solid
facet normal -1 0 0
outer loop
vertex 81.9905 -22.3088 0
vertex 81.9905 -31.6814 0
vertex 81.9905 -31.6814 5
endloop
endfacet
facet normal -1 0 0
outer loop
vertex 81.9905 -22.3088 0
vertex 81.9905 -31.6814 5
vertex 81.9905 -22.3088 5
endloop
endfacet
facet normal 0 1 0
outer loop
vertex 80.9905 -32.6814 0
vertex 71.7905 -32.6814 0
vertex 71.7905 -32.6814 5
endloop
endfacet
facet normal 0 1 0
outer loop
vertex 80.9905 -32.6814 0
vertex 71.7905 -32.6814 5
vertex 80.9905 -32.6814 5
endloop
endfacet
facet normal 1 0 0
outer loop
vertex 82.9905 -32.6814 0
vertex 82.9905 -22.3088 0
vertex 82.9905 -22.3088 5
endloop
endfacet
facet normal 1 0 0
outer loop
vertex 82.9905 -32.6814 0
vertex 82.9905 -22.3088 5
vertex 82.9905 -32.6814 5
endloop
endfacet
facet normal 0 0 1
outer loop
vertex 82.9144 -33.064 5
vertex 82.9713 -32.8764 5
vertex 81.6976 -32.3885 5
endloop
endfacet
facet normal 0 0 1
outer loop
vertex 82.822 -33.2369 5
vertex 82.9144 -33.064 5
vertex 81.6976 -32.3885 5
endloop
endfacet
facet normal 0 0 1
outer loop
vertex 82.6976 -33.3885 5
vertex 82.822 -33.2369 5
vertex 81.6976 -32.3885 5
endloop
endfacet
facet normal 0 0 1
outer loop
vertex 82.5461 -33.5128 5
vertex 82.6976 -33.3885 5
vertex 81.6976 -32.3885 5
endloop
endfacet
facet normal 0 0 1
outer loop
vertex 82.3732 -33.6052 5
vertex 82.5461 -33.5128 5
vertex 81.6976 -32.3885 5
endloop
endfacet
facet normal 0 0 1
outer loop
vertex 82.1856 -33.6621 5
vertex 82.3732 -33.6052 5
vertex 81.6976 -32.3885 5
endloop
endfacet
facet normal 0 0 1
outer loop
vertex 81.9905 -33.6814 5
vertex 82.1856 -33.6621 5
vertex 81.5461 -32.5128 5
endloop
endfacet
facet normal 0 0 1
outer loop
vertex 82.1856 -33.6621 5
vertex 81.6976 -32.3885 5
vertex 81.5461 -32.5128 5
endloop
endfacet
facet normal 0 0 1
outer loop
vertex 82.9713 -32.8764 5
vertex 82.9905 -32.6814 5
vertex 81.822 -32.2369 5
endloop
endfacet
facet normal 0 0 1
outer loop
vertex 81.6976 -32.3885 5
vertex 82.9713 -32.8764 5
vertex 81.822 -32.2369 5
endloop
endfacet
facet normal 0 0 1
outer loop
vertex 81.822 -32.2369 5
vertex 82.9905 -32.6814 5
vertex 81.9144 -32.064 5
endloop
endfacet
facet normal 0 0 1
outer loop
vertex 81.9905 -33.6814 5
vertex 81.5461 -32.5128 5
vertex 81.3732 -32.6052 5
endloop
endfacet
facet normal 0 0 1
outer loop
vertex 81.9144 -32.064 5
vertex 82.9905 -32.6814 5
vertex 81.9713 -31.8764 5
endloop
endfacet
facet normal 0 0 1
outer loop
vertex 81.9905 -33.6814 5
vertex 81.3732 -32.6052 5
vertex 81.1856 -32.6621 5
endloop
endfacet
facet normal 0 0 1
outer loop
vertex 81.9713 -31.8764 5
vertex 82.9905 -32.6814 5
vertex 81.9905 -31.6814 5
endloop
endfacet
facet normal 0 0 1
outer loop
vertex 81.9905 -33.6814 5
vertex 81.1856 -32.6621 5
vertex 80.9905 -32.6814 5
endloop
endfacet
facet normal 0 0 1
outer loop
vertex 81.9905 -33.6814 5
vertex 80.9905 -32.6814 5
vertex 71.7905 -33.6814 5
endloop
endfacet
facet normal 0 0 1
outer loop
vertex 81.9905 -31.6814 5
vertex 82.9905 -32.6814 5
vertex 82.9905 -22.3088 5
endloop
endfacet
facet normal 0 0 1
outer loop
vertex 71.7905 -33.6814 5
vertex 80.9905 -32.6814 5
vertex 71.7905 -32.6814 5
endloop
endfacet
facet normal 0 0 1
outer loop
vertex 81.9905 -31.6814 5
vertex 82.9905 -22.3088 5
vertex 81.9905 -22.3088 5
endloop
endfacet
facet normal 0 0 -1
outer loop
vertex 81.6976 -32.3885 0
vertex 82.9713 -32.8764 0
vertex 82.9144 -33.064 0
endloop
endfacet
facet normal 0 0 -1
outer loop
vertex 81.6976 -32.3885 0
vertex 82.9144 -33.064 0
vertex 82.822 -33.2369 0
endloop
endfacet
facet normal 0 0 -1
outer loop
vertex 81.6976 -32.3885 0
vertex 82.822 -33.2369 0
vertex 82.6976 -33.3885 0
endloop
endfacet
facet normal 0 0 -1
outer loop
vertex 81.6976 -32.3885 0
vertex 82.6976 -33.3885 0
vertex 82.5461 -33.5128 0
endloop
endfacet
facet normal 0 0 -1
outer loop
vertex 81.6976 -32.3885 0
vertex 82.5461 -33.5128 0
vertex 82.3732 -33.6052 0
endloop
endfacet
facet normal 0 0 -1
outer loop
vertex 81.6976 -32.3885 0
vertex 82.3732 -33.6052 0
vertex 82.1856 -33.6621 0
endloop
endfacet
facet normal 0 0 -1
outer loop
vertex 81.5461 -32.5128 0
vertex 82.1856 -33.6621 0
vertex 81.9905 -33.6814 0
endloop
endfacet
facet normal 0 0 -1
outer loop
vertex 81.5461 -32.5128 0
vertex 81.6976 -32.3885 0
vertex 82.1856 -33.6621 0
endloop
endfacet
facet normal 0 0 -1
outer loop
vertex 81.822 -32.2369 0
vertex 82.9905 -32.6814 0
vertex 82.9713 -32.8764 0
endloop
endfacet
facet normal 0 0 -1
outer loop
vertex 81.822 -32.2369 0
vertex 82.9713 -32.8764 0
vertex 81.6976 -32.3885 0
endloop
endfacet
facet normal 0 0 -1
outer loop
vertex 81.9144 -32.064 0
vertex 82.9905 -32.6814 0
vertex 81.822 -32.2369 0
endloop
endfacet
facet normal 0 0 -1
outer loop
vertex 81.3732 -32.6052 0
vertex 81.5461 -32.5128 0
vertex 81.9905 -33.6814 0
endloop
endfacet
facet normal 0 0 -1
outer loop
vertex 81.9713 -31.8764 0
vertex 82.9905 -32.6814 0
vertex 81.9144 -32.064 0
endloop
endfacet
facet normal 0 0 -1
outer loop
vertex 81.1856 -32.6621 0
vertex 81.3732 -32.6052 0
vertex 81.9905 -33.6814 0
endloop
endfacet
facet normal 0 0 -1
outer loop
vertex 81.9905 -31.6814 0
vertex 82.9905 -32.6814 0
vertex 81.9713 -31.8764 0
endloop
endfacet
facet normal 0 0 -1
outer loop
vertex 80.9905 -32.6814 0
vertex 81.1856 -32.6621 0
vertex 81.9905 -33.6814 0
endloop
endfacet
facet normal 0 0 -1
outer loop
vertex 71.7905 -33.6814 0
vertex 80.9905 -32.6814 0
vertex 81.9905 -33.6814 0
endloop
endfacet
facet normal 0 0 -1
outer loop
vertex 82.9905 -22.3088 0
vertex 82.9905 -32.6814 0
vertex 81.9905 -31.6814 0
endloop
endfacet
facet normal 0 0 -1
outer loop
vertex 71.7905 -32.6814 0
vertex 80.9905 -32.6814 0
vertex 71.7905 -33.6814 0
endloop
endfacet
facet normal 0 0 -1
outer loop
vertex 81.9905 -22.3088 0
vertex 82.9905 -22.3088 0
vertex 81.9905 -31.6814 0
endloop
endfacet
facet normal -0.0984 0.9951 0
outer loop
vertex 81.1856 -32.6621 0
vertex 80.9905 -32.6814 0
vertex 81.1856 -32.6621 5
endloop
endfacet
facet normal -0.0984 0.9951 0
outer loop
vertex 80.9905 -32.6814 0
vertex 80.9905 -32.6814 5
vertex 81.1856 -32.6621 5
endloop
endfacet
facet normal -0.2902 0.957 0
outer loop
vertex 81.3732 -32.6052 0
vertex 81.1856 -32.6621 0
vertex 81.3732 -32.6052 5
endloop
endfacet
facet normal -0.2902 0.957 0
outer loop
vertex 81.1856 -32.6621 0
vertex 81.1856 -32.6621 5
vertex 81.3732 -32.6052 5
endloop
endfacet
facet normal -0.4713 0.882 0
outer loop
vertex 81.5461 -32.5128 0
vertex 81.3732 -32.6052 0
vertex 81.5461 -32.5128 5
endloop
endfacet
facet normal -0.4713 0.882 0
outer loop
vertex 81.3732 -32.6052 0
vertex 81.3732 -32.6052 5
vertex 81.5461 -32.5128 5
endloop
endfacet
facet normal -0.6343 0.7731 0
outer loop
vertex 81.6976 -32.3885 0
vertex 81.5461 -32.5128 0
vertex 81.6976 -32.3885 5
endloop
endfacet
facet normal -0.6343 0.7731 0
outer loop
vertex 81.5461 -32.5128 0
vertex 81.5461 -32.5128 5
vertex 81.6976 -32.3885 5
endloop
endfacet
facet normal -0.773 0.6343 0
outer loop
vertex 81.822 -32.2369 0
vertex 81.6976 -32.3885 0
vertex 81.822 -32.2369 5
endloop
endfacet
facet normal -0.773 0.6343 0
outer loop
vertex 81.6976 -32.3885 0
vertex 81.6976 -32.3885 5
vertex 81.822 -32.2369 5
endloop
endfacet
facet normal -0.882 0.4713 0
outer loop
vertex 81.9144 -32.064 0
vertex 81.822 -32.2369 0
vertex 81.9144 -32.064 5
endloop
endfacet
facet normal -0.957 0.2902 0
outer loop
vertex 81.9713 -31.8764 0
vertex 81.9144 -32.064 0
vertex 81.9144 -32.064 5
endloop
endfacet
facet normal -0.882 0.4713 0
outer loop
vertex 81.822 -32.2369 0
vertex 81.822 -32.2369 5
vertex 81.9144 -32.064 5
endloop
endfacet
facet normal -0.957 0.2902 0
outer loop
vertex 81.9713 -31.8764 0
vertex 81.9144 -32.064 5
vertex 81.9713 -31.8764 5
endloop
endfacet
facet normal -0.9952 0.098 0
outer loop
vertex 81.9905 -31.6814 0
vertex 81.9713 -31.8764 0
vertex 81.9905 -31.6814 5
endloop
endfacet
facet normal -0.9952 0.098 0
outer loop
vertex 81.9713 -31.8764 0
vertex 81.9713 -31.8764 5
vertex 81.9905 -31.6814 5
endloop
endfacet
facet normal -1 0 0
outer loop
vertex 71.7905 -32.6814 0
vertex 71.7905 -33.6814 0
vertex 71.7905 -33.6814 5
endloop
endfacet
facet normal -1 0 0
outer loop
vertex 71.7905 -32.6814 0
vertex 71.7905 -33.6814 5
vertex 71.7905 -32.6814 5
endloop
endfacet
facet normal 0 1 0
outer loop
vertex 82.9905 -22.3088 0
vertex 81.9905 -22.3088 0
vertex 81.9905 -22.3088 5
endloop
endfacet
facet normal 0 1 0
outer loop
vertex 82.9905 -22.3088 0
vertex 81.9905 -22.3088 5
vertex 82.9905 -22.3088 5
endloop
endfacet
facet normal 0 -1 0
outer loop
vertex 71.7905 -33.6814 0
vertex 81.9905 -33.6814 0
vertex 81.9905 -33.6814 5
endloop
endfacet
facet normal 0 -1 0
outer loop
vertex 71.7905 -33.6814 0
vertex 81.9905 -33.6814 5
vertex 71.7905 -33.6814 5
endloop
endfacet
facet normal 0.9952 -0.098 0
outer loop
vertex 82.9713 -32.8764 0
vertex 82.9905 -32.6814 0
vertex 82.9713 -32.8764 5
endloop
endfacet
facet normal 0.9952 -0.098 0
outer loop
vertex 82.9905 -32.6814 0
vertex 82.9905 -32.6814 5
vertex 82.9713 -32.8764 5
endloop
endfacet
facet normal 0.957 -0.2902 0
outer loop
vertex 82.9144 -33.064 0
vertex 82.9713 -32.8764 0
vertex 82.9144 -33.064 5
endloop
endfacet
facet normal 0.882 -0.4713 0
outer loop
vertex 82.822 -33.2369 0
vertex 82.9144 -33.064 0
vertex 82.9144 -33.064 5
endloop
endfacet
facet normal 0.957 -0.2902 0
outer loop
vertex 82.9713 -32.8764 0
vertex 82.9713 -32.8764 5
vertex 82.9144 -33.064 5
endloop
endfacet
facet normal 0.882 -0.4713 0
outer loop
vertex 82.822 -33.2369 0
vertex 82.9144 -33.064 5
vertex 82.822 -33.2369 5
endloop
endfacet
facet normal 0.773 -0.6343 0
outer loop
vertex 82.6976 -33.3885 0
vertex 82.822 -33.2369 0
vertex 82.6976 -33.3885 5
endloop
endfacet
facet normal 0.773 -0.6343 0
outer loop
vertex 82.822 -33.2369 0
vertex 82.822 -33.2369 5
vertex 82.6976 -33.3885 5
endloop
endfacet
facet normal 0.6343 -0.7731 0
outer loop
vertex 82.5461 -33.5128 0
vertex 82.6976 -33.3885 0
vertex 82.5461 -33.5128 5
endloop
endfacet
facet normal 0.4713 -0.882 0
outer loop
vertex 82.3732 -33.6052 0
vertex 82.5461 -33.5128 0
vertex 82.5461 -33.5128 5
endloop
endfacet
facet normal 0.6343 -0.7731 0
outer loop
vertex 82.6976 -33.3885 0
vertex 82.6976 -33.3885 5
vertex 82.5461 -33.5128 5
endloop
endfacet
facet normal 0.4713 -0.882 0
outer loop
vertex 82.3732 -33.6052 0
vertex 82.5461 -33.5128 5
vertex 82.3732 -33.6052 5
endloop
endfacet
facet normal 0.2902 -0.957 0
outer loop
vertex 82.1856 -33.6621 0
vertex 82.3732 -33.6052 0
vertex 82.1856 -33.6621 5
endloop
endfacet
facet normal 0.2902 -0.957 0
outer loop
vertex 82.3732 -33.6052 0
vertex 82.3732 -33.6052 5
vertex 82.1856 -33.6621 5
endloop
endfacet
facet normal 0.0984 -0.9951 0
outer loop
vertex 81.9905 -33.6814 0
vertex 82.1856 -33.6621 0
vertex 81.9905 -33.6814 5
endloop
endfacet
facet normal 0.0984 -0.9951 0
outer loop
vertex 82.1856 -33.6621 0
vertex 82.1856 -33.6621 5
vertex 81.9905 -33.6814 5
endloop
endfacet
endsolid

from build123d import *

# Parameters (mm, degrees)
EKSTR_ZYON_NCE2_DEPTH = 5
RADYUS1_R             = 1


with BuildPart() as part:
    # Çizim1 → Ekstrüzyon-İnce2 (new body)
    with BuildSketch(Plane.XY):
        Polygon((82.990542752, -22.308839901), (82.990542752, -33.681351263), (71.790542752, -33.681351263), (71.790542752, -32.681351263), (81.990542752, -32.681351263), (81.990542752, -22.308839901), align=None)
    extrude(amount=EKSTR_ZYON_NCE2_DEPTH)

    # Radyus1
    radyus1_edges = [part.edges().sort_by_distance(p)[0] for p in [
        (81.990542752, -32.681351263, 2.5),
        (82.990542752, -33.681351263, 2.5),
    ]]
    fillet(radyus1_edges, radius=RADYUS1_R)


solid = part.part
